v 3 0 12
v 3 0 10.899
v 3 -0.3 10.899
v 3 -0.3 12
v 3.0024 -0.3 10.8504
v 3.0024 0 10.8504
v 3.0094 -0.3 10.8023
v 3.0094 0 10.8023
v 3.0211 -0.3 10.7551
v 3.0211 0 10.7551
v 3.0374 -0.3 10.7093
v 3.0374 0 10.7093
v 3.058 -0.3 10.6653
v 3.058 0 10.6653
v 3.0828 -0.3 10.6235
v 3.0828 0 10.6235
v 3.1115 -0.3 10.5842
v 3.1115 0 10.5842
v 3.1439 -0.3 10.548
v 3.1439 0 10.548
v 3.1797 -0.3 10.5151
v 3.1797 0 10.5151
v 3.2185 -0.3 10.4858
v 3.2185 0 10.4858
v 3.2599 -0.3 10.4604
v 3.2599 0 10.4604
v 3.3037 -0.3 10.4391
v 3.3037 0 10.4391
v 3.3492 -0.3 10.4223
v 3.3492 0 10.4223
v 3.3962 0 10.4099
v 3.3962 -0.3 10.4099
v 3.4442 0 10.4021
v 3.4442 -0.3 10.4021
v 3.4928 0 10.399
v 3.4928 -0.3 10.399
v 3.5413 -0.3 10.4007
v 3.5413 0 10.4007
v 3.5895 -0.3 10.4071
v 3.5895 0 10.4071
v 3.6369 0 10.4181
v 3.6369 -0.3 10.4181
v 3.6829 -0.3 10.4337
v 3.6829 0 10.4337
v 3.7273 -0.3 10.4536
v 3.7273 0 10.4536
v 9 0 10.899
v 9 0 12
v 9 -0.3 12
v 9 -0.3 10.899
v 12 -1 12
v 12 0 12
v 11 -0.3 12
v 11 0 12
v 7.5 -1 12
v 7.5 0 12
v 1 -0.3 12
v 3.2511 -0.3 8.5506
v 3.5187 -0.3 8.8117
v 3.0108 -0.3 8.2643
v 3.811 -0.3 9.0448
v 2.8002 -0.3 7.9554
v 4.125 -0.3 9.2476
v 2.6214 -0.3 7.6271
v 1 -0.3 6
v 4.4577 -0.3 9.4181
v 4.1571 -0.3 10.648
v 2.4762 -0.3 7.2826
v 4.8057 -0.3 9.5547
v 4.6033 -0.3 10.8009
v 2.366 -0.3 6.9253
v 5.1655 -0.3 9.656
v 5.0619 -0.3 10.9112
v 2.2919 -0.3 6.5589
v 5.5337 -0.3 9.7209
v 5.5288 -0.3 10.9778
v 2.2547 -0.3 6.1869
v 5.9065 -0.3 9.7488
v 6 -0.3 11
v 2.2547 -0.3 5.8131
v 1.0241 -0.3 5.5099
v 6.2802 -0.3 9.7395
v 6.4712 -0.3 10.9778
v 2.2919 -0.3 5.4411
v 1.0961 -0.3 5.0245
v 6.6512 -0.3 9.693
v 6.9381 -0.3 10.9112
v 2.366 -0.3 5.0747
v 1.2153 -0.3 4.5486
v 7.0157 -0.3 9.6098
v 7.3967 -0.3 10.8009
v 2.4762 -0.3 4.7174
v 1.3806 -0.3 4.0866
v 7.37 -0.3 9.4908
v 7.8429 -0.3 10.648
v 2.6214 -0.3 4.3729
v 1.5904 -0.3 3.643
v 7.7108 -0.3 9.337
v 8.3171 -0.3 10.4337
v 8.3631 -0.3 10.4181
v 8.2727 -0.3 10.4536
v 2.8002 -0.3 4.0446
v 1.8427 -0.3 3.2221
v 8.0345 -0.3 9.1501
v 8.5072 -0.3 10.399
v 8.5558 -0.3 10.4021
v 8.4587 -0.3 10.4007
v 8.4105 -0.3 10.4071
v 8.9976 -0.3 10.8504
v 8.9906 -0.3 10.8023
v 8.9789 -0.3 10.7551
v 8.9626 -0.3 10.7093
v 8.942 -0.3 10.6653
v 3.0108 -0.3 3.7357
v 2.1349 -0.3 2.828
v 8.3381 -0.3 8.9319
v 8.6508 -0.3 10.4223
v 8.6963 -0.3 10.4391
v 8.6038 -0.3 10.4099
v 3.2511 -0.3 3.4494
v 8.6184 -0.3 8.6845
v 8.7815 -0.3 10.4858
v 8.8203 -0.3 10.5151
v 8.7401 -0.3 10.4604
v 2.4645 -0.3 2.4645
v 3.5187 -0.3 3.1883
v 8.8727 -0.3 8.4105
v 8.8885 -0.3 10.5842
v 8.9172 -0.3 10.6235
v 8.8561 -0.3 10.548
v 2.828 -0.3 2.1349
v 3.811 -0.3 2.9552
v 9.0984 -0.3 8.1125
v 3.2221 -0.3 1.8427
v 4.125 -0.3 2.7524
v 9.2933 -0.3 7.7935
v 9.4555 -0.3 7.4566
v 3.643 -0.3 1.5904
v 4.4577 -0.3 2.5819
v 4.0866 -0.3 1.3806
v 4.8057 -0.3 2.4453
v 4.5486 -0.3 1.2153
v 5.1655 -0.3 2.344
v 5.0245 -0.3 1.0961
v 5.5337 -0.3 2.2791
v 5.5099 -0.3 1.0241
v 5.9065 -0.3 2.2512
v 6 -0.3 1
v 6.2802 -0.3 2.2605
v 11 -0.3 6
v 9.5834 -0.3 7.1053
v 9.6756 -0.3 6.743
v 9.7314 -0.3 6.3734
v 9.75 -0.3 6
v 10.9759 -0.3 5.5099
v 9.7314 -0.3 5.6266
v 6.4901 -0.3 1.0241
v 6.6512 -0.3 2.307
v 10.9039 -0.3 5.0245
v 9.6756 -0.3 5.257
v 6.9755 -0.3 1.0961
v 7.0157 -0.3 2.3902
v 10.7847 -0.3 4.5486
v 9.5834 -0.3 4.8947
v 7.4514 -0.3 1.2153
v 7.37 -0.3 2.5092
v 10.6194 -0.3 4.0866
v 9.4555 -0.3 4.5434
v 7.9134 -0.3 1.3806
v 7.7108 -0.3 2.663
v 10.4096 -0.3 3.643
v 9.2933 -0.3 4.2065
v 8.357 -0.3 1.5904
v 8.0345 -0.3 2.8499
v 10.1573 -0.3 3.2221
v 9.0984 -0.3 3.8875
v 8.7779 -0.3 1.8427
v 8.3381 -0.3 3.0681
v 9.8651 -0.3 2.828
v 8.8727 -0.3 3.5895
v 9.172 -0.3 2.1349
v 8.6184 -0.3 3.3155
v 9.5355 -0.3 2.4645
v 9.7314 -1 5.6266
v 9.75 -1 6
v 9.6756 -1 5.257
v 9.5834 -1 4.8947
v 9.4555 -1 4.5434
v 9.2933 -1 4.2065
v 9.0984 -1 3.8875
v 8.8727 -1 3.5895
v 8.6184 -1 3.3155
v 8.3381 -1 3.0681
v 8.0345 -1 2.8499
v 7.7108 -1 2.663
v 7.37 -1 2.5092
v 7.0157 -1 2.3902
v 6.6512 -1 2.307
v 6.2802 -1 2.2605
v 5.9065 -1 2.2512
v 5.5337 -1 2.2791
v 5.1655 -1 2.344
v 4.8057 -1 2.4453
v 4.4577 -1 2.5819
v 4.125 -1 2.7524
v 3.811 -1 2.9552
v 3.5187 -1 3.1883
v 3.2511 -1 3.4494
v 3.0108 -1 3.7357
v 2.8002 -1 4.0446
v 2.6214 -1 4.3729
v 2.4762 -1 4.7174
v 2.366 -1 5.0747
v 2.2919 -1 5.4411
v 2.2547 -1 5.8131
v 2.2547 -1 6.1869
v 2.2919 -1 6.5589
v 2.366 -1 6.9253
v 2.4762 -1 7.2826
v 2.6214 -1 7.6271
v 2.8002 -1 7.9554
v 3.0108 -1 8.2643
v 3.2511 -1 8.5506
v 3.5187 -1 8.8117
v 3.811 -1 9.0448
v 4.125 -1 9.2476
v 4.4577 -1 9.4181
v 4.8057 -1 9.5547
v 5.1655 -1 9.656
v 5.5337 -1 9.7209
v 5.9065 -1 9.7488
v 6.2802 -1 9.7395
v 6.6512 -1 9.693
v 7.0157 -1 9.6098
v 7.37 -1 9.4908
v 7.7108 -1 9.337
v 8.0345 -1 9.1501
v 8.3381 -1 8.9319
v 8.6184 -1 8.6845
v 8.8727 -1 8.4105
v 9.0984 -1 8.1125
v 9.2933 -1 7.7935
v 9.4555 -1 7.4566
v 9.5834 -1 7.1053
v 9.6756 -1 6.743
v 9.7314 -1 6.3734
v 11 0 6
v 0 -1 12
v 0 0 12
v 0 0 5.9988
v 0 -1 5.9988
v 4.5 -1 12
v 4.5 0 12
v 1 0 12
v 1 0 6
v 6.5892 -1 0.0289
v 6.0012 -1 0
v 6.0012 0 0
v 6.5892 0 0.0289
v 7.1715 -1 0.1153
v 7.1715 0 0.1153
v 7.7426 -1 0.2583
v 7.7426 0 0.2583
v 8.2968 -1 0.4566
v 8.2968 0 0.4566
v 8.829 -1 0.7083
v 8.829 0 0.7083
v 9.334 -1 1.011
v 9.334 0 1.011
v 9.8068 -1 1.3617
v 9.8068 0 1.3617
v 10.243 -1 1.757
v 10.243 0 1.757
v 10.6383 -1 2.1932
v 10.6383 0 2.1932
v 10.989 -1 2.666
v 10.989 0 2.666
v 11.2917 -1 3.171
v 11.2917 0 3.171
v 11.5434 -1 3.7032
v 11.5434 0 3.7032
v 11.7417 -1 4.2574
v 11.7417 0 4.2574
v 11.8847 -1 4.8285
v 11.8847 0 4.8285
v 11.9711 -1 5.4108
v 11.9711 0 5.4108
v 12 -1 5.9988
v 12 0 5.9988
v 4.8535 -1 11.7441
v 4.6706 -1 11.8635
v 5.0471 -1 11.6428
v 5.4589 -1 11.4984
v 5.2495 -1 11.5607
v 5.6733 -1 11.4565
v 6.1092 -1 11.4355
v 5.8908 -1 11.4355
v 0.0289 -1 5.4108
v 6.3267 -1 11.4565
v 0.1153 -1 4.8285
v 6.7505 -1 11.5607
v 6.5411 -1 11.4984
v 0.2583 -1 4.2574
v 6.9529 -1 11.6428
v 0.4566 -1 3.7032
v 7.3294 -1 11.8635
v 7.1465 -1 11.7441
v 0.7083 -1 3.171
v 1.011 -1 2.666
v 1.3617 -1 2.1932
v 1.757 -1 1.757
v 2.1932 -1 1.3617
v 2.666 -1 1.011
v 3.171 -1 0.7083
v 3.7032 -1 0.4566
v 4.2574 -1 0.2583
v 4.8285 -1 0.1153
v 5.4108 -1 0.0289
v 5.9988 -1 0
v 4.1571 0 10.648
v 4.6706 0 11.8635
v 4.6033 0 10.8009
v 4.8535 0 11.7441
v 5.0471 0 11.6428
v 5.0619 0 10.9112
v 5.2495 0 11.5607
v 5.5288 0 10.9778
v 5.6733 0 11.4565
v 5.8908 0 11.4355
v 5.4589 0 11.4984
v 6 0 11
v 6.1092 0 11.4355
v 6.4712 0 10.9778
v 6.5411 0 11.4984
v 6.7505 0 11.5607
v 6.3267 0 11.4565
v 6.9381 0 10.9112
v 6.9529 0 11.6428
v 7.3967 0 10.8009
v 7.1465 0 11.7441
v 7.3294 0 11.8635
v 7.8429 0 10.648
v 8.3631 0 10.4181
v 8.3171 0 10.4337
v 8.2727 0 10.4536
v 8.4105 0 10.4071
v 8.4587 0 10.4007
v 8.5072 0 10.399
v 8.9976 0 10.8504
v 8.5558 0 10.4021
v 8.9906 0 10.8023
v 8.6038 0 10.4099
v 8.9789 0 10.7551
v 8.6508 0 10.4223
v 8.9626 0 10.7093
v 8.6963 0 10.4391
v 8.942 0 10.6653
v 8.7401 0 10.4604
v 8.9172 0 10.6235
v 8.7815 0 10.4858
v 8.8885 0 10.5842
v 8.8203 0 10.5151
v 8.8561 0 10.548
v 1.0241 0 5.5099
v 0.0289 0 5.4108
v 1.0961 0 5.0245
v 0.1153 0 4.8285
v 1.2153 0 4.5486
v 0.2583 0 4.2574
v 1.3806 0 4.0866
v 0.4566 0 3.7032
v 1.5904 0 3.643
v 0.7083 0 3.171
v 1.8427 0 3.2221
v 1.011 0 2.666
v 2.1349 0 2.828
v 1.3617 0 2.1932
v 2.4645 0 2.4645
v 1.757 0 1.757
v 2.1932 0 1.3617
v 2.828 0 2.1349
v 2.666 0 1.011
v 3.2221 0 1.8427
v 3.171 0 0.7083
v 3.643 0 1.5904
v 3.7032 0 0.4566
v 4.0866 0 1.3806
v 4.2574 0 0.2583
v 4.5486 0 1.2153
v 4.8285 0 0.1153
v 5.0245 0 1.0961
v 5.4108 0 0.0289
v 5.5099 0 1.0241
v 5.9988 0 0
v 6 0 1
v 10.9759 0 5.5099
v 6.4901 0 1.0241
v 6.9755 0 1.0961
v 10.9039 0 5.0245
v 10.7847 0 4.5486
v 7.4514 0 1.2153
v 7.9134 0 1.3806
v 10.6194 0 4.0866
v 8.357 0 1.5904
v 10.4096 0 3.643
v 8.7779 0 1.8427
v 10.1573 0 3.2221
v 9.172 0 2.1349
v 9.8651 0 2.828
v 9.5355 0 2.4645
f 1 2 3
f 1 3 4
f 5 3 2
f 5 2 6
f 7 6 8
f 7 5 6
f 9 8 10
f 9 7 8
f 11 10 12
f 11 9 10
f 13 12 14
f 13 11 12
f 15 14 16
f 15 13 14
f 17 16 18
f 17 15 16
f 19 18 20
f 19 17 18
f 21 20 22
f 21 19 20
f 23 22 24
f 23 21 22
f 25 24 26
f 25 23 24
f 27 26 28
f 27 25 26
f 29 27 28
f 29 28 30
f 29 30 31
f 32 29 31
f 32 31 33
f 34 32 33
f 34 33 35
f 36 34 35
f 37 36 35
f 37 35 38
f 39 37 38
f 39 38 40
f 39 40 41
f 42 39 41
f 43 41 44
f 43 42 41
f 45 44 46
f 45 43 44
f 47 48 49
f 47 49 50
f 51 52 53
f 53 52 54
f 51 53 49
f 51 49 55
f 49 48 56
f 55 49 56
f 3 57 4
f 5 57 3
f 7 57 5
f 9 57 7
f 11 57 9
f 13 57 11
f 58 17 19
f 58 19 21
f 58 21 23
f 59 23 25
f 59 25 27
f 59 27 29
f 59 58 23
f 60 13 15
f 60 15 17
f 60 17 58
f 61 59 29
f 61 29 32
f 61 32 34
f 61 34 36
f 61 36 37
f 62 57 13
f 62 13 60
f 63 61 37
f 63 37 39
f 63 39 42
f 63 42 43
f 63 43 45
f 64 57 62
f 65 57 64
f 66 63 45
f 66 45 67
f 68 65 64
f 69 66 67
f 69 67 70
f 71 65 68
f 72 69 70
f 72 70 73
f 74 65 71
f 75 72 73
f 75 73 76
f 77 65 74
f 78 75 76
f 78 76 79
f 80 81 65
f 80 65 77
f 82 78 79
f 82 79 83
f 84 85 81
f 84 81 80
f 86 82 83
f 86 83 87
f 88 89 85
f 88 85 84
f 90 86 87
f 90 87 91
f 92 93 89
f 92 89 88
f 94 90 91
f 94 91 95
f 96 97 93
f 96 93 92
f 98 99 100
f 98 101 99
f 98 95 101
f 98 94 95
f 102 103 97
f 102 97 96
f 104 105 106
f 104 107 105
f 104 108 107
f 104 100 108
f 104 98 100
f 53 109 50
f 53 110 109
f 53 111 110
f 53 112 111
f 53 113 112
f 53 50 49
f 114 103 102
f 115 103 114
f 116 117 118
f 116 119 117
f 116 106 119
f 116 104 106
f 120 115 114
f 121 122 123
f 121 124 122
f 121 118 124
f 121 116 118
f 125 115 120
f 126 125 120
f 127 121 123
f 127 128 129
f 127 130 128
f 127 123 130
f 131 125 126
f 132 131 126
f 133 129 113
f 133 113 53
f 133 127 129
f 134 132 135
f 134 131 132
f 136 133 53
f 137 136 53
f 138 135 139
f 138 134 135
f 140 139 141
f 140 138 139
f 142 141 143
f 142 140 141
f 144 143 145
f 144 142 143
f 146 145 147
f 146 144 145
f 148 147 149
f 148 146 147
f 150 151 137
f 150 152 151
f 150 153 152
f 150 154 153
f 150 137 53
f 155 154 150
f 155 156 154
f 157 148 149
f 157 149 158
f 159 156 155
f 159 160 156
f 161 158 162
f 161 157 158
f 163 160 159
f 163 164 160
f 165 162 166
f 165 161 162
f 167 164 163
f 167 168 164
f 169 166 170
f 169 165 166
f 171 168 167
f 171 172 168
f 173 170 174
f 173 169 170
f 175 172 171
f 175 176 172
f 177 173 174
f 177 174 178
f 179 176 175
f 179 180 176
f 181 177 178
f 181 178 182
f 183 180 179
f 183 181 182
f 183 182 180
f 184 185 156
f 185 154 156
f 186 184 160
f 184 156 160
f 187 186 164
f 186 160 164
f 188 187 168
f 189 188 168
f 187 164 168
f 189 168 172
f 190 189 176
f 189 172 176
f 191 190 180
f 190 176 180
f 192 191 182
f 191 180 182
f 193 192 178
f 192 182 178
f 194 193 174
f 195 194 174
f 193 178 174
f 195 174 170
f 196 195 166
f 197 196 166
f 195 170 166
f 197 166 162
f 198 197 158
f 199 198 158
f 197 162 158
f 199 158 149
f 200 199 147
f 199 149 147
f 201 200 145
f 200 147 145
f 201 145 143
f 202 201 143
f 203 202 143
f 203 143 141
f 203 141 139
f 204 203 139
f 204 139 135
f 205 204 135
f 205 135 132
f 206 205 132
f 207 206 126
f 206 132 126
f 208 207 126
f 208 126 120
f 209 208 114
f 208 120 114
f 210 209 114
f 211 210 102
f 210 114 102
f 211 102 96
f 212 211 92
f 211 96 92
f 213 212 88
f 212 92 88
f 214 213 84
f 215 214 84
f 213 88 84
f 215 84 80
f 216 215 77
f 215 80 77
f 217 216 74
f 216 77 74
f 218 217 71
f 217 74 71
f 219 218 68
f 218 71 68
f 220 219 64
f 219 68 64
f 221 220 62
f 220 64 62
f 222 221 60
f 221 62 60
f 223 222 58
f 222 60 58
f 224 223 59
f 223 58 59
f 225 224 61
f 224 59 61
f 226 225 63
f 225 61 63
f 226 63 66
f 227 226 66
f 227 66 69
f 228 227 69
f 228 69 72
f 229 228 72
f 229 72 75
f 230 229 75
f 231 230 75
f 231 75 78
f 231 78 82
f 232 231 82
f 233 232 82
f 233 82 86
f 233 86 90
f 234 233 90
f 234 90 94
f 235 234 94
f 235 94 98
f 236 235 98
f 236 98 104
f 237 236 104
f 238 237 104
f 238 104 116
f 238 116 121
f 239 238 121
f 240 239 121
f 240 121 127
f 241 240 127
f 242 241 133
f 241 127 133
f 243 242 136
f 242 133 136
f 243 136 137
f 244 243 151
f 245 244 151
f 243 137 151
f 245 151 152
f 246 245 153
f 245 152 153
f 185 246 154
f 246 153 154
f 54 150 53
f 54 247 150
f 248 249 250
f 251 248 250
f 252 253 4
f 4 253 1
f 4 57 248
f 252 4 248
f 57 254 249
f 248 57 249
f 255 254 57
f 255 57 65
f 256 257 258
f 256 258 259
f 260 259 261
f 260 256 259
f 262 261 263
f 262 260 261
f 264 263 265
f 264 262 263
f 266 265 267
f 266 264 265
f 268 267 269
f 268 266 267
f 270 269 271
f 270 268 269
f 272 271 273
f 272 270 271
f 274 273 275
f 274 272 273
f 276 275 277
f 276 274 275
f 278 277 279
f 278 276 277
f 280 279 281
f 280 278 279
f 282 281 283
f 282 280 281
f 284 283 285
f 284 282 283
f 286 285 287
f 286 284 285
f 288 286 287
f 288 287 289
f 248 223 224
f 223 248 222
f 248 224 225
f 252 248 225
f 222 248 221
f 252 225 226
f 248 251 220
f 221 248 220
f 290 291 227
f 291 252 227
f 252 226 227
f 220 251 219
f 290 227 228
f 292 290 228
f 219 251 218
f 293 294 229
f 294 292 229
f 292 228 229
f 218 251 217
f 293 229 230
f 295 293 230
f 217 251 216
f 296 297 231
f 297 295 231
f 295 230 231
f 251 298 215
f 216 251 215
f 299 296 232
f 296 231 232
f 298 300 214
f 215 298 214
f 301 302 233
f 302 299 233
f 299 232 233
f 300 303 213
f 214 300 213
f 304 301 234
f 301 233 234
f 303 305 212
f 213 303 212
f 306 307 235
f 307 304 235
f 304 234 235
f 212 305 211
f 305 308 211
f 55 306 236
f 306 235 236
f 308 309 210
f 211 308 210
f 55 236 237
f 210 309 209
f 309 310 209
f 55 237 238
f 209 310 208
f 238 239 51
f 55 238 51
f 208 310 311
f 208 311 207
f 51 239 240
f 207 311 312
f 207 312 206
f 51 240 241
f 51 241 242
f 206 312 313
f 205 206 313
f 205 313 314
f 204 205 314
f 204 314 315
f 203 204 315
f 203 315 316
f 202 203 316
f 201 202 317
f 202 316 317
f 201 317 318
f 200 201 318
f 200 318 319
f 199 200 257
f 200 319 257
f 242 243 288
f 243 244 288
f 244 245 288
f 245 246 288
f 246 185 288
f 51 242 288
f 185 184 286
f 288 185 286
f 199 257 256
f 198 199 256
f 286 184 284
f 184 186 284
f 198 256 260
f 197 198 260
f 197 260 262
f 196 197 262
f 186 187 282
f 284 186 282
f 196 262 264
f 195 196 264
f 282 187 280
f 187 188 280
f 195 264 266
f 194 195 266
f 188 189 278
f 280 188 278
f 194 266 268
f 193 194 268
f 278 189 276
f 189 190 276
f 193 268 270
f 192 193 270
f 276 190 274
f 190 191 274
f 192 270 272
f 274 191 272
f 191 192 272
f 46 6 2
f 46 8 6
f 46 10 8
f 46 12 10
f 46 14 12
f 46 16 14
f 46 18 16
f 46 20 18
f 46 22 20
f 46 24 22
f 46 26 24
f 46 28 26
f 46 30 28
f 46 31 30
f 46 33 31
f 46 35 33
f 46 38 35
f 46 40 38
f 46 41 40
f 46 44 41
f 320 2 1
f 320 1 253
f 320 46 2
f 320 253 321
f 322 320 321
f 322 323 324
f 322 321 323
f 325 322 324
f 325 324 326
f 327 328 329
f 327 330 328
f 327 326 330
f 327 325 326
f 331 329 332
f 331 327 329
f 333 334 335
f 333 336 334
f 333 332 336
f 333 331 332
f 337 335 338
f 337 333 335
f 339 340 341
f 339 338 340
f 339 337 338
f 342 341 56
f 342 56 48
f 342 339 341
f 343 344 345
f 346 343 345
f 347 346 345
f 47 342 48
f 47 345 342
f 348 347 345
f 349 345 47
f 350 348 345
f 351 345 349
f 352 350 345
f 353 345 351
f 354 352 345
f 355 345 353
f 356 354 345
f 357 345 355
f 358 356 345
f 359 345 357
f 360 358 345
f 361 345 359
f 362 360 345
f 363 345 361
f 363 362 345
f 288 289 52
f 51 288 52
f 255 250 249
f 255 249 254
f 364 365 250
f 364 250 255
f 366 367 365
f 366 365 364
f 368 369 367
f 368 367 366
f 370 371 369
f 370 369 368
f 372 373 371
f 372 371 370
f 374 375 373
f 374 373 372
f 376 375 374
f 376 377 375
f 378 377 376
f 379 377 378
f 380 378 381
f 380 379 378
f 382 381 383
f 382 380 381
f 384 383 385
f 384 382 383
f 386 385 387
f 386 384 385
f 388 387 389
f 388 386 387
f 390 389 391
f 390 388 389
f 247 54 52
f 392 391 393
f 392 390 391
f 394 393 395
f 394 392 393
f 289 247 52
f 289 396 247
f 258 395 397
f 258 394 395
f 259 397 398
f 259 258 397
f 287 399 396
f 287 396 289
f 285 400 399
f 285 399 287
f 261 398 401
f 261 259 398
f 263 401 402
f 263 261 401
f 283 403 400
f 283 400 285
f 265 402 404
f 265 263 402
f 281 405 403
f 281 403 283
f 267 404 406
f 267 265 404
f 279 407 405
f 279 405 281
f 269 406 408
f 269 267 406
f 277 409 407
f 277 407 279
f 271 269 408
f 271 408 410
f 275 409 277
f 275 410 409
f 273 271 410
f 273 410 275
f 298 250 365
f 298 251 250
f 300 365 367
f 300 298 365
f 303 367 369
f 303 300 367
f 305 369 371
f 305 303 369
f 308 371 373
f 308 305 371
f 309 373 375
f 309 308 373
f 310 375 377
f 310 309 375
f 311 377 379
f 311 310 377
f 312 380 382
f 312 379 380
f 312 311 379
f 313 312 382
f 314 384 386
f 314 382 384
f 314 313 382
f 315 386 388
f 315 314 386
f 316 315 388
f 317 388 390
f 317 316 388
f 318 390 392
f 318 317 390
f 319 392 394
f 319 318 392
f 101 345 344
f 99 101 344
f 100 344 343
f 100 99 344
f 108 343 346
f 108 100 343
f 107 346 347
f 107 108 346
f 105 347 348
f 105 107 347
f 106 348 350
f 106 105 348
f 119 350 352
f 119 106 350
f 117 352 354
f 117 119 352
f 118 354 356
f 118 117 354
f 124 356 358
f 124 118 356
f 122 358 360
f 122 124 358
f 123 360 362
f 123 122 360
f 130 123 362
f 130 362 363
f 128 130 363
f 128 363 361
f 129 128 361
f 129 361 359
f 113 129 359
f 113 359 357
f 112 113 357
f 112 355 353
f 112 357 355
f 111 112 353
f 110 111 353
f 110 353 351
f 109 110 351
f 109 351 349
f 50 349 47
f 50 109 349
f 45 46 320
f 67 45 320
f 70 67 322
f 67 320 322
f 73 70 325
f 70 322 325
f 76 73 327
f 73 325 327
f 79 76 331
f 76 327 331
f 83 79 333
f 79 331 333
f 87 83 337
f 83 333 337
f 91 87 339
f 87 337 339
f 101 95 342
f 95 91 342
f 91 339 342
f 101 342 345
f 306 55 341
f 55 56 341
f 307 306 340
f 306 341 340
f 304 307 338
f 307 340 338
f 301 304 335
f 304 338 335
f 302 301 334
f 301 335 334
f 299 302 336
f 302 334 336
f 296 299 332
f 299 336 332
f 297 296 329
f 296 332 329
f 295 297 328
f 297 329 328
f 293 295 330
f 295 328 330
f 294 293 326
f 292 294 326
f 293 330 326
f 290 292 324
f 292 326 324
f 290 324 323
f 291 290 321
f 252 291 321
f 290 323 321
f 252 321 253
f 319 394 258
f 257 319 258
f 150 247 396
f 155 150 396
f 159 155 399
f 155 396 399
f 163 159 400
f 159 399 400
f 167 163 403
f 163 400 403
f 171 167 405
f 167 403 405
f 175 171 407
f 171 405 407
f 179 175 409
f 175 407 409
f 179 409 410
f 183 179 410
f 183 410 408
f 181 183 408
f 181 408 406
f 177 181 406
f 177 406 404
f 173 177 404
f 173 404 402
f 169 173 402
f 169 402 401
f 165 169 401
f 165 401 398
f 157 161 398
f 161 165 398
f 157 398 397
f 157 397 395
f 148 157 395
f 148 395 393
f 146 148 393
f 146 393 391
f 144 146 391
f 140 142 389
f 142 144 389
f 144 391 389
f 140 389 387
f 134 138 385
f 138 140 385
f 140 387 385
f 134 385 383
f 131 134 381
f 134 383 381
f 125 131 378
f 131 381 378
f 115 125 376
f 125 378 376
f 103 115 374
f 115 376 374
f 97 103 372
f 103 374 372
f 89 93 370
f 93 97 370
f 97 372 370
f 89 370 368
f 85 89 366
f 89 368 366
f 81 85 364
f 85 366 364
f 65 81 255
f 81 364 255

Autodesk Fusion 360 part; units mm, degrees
sketch "Sketch1" plane through (0, 0, 0) normal (0, 1, 0) x (1, 0, 0)
  line L0 (0, 0) -> (12, 0)
  line L1 (12, 0) -> (12, -12)
  line L2 (12, -12) -> (0, -12)
  line L3 (0, -12) -> (0, 0)
  circle A0 centre (6, -6) radius 3.75
  line L4 (6, 0) -> (6, -12) construction
  circle A1 centre (6, -6) radius 5
  line L5 (2, -12) -> (2, -9) construction
  line L6 (1, -12) -> (1, -6)
  line L7 (3, -10) -> (3, -12)
  arc A2 (7.5, -12) -> (4.5, -12) centre (6, -13.7) ccw
  dimension "d1" = 12
  dimension "d2" = 12
  dimension "d3" = 7.5
  dimension "d4" = 10
  dimension "d5" = 4
  dimension "d6" = 2
  dimension "d16" = 3
  dimension "d17" = 1.7
extrude "Extrude1" add sketch "Sketch1" against normal blind 1 contours L0 L1 L2 L3 A1 L6 L7 A2 | L2 A1 L6 L7 | A1
extrude "Extrude2" cut sketch "Sketch1" against normal blind 0.3 contours A1
extrude "Extrude3" cut sketch "Sketch1" against normal blind 0.3 contours L2 A1 L6 L7
ref_plane "WorkPlane1" through (6, -0.5, 6) normal (1, 0, 0) x (0, 0, 1)
mirror "Mirror1" about plane through (6, -0.5, 6) normal (1, 0, 0) of "Extrude3"
fillet "Fillet1" radius 6 2 edges at (0, -0.5, 0) (12, -0.5, 0)
fillet "Fillet2" radius 0.5 2 edges at (3, -0.15, 10) (9, -0.15, 10)
equation "d3 = ( 3.75 * 2 ) * 1 mm"
